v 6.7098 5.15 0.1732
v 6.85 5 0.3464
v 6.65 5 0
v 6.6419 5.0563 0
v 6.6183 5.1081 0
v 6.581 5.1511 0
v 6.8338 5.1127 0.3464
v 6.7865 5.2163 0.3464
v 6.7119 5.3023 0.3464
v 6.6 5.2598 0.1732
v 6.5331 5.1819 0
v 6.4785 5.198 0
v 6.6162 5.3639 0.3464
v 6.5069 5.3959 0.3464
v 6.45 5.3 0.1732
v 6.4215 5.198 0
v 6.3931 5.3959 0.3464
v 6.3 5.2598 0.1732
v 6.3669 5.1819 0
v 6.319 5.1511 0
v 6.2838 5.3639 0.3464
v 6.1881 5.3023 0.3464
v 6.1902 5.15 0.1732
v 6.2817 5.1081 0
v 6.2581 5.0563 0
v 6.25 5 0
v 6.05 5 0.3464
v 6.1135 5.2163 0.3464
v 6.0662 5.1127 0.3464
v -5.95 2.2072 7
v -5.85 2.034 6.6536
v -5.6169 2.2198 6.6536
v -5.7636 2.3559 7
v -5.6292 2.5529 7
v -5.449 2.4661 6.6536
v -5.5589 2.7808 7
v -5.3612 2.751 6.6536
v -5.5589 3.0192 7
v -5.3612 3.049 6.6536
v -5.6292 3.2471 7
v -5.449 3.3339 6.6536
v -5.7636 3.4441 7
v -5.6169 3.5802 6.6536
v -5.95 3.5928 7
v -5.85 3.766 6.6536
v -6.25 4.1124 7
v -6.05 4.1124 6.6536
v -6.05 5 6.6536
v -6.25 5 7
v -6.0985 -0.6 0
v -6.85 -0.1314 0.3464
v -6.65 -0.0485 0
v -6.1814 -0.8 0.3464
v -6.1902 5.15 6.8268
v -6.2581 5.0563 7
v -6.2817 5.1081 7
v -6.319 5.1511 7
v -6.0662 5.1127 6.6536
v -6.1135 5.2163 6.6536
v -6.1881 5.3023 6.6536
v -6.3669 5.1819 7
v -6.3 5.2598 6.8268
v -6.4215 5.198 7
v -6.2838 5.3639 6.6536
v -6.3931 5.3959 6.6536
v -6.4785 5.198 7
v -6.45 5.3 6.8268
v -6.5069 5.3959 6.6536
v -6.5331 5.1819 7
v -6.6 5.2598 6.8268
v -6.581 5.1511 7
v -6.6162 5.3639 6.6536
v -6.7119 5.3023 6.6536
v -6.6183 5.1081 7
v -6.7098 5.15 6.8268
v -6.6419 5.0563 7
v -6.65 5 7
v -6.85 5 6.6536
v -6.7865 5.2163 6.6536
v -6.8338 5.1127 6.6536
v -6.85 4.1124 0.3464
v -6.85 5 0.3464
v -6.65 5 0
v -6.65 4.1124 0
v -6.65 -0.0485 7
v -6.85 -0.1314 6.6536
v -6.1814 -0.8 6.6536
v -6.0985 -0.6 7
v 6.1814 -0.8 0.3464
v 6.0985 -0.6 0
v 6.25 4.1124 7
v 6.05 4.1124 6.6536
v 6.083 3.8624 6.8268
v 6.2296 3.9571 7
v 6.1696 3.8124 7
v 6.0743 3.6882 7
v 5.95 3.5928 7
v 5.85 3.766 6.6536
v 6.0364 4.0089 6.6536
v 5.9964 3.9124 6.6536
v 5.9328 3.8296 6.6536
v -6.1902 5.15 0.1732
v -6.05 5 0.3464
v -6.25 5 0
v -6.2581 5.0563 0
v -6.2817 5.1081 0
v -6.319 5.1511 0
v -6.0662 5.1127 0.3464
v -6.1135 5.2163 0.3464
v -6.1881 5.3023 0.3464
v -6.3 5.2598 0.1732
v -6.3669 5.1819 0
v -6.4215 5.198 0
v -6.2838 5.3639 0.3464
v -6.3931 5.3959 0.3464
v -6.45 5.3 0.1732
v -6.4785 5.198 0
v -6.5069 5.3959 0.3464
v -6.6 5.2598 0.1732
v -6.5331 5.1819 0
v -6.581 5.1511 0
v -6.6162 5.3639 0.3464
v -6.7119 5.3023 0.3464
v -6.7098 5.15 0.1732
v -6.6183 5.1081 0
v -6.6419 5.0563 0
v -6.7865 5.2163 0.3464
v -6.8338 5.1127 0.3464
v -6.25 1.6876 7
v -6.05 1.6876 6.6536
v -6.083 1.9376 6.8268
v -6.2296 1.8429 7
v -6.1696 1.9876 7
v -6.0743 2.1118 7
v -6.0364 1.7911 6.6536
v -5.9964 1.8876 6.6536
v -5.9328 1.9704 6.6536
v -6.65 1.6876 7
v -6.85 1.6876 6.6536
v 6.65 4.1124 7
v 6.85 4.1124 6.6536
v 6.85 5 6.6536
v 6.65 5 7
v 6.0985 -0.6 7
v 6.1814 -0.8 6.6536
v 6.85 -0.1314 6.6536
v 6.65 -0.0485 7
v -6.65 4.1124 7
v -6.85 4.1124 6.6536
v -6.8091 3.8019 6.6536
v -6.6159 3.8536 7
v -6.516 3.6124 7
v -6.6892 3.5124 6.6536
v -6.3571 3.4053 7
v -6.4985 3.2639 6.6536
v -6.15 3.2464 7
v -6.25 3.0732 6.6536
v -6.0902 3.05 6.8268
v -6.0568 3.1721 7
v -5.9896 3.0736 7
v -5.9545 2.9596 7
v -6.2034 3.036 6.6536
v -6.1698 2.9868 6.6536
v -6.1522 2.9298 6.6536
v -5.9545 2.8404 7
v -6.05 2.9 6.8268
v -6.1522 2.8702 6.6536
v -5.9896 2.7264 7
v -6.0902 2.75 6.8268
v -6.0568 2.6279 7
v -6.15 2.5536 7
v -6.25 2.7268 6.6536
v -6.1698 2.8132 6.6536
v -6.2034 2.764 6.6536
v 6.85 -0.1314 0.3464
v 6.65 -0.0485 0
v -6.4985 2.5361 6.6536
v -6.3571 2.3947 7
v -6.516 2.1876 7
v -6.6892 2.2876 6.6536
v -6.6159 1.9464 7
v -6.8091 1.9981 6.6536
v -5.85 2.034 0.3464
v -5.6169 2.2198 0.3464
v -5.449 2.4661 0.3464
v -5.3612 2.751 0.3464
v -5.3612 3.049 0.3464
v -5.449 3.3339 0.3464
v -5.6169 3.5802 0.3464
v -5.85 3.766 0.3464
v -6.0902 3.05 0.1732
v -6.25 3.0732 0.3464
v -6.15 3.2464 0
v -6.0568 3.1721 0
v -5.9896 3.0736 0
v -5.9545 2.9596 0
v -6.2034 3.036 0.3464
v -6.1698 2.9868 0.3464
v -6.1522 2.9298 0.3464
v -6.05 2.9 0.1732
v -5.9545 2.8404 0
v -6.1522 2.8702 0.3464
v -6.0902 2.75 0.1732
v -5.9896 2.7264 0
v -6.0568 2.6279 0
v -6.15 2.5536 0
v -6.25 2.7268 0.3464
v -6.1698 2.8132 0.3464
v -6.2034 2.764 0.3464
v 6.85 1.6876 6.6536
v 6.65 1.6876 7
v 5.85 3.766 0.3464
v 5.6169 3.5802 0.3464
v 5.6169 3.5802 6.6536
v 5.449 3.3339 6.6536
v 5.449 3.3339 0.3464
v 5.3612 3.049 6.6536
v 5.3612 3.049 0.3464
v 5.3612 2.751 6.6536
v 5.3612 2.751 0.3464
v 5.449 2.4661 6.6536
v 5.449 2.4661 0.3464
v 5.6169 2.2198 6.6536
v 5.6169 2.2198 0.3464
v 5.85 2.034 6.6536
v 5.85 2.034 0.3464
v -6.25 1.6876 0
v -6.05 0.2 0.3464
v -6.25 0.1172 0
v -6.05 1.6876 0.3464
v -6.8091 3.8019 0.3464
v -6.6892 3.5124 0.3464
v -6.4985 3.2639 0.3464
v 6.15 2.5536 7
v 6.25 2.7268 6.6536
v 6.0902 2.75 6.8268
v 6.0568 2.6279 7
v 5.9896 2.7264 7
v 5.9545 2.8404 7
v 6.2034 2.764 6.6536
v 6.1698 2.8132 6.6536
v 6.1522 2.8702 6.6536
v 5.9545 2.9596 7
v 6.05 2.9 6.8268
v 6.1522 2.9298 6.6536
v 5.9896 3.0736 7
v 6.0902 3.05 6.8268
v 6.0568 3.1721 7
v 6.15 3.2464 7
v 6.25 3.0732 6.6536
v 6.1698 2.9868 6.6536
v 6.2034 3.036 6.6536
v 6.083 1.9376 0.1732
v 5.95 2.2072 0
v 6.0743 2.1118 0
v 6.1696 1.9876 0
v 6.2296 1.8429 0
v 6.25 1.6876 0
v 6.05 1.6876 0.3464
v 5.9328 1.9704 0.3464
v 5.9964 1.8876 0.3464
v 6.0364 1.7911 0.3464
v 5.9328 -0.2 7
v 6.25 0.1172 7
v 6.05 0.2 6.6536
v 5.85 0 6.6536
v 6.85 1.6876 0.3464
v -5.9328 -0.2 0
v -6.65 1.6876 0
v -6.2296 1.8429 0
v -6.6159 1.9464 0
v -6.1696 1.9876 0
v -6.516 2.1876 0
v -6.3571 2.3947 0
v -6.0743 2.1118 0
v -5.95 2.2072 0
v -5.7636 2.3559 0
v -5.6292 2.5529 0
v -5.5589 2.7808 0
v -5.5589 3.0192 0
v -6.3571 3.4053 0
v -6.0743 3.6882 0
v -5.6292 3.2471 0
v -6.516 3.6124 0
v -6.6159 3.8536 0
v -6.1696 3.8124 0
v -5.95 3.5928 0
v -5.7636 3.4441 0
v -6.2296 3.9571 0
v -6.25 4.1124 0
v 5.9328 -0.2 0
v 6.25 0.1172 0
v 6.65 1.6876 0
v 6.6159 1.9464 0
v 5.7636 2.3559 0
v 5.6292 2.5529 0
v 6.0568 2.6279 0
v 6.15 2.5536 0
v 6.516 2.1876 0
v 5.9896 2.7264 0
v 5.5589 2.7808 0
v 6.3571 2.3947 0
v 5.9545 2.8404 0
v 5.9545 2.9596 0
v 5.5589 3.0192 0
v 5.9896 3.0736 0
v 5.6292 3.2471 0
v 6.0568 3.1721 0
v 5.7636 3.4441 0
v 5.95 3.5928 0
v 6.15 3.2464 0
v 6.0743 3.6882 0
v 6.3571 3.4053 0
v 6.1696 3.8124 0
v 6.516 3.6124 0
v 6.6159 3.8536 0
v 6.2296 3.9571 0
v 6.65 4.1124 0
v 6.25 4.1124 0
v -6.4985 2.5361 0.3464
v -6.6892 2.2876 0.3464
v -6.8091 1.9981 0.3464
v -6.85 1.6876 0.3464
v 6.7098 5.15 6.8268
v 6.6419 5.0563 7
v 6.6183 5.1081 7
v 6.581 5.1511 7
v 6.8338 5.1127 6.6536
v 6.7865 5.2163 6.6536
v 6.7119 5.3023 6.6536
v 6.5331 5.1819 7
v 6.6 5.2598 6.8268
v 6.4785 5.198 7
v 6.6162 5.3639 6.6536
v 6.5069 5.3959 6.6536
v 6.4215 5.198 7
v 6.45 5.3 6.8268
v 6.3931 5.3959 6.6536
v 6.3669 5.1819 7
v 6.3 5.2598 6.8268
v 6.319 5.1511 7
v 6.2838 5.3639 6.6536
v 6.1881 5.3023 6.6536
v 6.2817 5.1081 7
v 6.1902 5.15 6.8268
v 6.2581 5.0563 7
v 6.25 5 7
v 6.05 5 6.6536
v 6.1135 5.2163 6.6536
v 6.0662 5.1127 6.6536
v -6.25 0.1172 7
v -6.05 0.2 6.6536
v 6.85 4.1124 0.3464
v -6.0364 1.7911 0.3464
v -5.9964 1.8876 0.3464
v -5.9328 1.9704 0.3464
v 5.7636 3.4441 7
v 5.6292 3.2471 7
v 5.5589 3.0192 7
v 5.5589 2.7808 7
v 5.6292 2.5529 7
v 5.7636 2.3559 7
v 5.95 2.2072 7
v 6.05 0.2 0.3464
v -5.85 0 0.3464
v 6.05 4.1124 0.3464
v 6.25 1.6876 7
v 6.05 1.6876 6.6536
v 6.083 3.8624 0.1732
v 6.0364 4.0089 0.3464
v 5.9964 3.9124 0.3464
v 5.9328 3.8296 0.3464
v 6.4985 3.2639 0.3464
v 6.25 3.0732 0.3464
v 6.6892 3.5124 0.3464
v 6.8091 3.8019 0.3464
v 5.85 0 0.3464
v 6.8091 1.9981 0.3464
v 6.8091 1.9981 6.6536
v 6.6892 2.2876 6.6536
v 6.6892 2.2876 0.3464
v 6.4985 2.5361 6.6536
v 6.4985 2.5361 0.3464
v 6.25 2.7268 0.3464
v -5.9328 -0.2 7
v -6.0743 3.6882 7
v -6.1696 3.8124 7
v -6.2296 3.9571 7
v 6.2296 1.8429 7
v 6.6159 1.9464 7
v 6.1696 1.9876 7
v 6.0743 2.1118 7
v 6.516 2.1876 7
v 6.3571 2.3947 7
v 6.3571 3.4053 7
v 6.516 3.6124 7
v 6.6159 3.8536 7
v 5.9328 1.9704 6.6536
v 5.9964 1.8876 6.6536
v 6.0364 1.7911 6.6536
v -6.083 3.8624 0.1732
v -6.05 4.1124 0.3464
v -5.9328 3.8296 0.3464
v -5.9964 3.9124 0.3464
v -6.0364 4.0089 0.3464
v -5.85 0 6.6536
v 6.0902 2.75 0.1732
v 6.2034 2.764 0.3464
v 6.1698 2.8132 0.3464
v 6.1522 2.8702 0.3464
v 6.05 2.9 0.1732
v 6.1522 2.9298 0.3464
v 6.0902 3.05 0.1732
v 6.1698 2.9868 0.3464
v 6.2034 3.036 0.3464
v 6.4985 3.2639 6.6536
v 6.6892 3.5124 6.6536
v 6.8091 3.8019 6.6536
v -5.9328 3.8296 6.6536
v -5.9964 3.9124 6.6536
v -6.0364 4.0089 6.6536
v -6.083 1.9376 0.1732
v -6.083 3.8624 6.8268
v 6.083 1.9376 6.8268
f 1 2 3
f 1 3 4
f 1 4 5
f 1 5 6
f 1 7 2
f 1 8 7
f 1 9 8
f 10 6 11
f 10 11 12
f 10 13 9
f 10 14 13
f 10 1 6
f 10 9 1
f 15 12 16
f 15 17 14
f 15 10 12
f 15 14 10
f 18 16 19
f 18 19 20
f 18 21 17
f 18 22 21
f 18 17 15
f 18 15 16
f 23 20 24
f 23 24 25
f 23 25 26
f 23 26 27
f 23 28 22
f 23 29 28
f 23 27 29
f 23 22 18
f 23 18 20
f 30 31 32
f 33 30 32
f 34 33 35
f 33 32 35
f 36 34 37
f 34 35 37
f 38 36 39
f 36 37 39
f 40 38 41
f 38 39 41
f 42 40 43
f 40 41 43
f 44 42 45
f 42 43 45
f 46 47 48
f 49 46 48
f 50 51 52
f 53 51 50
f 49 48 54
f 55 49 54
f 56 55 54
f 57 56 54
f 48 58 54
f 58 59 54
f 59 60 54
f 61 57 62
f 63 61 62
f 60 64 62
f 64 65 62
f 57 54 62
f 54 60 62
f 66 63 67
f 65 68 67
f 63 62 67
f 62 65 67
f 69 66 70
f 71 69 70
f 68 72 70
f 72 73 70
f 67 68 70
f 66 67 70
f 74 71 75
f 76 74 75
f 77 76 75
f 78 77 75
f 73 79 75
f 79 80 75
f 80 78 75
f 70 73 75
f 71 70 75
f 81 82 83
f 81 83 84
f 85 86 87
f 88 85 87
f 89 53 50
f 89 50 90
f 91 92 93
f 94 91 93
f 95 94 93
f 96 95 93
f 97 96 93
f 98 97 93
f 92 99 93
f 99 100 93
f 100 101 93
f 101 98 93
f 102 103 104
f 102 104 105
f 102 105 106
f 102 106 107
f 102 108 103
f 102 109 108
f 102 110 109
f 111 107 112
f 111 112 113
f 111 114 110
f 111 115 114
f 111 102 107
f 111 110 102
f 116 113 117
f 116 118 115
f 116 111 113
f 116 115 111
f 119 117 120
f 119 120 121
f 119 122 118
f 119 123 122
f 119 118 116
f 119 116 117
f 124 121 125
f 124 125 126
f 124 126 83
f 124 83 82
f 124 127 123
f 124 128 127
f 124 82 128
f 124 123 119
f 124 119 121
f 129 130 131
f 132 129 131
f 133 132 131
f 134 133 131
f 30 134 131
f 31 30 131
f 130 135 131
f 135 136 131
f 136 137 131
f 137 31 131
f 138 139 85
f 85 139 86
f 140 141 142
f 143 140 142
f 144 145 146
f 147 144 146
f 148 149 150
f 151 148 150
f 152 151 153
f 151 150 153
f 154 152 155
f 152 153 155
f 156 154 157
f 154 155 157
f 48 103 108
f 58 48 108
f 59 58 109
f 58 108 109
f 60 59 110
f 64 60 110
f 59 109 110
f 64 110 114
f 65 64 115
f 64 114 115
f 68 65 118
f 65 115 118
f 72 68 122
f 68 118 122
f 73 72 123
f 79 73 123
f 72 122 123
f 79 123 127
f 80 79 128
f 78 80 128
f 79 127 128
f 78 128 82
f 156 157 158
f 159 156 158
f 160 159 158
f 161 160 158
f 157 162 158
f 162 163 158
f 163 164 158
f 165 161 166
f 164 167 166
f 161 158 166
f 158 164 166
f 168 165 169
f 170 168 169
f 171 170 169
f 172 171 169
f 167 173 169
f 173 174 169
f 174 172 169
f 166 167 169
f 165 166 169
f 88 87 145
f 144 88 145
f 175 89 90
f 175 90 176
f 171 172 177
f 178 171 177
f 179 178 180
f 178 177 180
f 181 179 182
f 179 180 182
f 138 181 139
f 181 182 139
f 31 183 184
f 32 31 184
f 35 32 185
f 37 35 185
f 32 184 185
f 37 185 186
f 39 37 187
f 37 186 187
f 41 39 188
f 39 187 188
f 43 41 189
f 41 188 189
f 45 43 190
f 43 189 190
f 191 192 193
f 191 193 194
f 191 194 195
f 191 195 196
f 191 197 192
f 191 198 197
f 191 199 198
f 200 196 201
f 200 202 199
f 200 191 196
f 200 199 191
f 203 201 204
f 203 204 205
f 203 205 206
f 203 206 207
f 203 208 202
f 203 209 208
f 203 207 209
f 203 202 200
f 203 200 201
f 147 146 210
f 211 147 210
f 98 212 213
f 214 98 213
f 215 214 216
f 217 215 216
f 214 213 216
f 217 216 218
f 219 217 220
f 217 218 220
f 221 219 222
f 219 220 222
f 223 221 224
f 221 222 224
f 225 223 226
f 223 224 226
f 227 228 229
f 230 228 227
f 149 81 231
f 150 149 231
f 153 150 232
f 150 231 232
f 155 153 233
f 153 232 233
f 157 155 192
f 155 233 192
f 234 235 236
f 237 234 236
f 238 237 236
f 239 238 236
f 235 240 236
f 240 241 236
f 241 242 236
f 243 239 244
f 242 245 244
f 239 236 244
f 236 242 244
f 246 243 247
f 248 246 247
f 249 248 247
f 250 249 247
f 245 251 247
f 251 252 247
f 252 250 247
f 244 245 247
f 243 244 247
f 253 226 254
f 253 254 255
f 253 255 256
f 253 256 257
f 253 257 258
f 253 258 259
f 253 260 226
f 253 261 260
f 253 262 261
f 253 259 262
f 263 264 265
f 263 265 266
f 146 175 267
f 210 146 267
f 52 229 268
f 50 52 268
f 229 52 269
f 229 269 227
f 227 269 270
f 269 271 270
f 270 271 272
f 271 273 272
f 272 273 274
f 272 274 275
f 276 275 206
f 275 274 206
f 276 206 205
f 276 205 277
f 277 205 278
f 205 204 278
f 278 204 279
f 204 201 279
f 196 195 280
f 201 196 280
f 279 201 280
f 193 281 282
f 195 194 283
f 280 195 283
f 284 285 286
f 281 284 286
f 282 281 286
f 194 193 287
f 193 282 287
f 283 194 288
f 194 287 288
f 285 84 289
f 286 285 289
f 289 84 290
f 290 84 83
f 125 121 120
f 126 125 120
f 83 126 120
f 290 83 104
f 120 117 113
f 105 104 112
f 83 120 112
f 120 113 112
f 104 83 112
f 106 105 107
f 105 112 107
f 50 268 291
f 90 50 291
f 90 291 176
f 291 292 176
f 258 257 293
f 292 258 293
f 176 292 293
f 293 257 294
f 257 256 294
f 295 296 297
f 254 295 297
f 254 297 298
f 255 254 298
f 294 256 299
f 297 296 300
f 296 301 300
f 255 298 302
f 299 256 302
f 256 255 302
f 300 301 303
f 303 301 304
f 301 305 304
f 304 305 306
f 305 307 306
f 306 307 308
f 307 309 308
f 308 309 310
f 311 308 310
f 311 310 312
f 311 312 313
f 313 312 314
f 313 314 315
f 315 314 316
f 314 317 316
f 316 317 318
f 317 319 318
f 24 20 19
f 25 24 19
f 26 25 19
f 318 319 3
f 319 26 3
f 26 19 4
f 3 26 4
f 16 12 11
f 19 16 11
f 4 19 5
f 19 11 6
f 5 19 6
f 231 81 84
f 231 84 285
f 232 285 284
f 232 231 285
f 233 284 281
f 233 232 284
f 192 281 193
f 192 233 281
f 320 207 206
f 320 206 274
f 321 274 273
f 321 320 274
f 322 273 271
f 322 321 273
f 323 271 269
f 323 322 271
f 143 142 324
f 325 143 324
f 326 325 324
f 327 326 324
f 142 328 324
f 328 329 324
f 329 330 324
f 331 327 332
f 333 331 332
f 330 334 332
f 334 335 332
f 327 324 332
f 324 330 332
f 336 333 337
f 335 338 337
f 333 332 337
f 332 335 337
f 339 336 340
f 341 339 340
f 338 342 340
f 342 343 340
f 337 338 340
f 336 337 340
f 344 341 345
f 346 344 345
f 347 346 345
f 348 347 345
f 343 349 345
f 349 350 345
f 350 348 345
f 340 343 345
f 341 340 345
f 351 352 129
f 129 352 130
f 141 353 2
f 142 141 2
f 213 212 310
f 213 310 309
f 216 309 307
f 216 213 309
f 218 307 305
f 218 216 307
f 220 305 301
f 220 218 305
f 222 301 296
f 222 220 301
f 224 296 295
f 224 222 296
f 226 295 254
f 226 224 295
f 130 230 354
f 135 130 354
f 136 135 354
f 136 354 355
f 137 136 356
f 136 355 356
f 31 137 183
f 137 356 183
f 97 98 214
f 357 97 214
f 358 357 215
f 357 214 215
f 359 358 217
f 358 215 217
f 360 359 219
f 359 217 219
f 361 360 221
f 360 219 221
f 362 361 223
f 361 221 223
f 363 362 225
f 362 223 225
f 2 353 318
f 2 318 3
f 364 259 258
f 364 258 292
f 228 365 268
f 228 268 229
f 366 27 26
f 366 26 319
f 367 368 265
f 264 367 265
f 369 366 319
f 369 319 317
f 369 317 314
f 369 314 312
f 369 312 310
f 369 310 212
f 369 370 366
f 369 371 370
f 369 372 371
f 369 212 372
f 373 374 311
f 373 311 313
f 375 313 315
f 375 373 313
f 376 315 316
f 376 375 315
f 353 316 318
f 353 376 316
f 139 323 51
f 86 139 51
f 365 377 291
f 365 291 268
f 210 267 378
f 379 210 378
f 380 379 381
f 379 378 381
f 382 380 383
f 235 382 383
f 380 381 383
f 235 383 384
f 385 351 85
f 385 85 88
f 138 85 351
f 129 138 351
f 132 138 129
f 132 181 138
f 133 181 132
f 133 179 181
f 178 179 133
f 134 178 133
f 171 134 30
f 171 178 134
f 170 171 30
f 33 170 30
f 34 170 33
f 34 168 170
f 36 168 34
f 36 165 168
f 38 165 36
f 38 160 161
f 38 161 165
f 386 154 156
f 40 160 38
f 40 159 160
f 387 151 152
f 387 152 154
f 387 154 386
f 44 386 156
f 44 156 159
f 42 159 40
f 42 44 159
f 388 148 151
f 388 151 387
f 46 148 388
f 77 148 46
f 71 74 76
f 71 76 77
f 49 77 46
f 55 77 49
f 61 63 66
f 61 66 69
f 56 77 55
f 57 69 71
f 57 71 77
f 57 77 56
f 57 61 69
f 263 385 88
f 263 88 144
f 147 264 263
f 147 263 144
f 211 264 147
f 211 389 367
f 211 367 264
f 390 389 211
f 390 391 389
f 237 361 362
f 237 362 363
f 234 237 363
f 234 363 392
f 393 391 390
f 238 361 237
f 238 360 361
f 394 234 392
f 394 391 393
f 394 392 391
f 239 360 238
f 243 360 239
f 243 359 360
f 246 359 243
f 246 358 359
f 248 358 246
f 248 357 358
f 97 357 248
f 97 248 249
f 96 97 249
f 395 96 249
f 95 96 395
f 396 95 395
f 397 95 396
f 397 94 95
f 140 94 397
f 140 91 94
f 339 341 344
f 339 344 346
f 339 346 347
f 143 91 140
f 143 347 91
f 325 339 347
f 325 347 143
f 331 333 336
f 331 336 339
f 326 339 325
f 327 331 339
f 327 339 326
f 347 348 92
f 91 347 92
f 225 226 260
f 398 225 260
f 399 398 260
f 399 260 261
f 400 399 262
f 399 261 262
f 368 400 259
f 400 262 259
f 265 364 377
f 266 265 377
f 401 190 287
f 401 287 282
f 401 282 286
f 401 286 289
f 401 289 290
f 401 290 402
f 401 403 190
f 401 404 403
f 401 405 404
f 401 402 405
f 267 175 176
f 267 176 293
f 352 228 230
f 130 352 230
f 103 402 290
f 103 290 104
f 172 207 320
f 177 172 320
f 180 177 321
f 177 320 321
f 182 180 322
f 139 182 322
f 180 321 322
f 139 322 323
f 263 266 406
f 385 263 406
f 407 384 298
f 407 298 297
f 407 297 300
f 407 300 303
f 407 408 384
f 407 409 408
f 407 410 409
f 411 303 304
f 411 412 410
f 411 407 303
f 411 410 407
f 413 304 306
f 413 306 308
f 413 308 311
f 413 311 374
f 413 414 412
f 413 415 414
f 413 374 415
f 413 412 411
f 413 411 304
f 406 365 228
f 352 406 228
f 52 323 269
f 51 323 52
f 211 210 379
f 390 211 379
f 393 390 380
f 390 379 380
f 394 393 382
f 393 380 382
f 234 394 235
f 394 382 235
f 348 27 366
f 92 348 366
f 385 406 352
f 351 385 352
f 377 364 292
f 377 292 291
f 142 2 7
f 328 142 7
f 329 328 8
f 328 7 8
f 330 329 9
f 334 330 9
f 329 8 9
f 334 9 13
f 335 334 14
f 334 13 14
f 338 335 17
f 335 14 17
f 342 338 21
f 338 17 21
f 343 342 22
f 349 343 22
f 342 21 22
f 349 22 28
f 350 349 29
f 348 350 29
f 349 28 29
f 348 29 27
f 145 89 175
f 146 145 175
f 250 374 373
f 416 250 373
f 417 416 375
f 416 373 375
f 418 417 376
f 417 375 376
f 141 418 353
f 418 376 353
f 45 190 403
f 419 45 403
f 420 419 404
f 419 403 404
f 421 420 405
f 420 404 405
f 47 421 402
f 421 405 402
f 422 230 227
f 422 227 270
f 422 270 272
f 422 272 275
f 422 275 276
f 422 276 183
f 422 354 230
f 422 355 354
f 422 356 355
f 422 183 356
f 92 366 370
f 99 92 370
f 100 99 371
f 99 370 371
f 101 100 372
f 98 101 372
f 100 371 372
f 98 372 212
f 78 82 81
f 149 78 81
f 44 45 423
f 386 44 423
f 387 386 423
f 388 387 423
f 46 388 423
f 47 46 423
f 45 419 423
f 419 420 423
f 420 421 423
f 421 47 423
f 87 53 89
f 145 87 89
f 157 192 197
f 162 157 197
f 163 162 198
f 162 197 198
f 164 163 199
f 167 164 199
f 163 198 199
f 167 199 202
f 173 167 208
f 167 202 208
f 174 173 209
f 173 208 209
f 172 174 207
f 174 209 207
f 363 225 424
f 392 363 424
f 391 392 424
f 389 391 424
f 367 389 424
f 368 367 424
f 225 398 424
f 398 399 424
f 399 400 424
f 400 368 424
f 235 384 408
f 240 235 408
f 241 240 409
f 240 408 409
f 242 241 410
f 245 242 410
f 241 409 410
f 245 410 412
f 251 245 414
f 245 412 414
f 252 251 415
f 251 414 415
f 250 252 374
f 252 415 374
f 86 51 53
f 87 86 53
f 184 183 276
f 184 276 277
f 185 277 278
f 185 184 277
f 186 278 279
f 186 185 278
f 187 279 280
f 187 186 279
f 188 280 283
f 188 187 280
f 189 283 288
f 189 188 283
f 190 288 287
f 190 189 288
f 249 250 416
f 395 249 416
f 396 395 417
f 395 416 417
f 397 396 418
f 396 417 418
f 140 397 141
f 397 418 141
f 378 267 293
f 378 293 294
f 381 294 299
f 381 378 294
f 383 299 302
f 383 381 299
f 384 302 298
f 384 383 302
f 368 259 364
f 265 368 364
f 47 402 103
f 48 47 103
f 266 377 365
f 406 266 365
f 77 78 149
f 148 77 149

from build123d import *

# Parameters (mm, degrees)
BOSS_EXTRUDE1_DEPTH   = 7
CHAMFER1_SIZE         = 0.2
CHAMFER1_SIZE2        = 0.346410162
CHAMFER1_PART_2_SIZE  = 0.2
CHAMFER1_PART_2_SIZE2 = 0.346410162


with BuildPart() as part:
    # Sketch1 → Boss-Extrude1 (new body)
    with BuildSketch(Plane.XY):
        with BuildLine():
            Line((5.85, 0), (-5.85, 0))
            Line((-5.85, 0), (-6.05, 0.2))
            Line((-6.05, 0.2), (-6.05, 1.687564435))
            ThreePointArc((-6.05, 1.687564435), (-5.996410162, 1.887564435), (-5.85, 2.033974596))
            ThreePointArc((-5.85, 2.033974596), (-5.35, 2.9), (-5.85, 3.766025404))
            ThreePointArc((-5.85, 3.766025404), (-5.996410162, 3.912435565), (-6.05, 4.112435565))
            Line((-6.05, 4.112435565), (-6.05, 5))
            ThreePointArc((-6.05, 5), (-6.45, 5.4), (-6.85, 5))
            Line((-6.85, 5), (-6.85, 4.112435565))
            ThreePointArc((-6.85, 4.112435565), (-6.689230485, 3.512435565), (-6.25, 3.073205081))
            ThreePointArc((-6.25, 3.073205081), (-6.15, 2.9), (-6.25, 2.726794919))
            ThreePointArc((-6.25, 2.726794919), (-6.689230485, 2.287564435), (-6.85, 1.687564435))
            Line((-6.85, 1.687564435), (-6.85, -0.13137085))
            Line((-6.85, -0.13137085), (-6.18137085, -0.8))
            Line((-6.18137085, -0.8), (6.18137085, -0.8))
            Line((6.18137085, -0.8), (6.85, -0.13137085))
            Line((6.85, -0.13137085), (6.85, 1.687564435))
            ThreePointArc((6.85, 1.687564435), (6.689230485, 2.287564435), (6.25, 2.726794919))
            ThreePointArc((6.25, 2.726794919), (6.15, 2.9), (6.25, 3.073205081))
            ThreePointArc((6.25, 3.073205081), (6.689230485, 3.512435565), (6.85, 4.112435565))
            Line((6.85, 4.112435565), (6.85, 5))
            ThreePointArc((6.85, 5), (6.45, 5.4), (6.05, 5))
            Line((6.05, 5), (6.05, 4.112435565))
            ThreePointArc((6.05, 4.112435565), (5.996410162, 3.912435565), (5.85, 3.766025404))
            ThreePointArc((5.85, 3.766025404), (5.35, 2.9), (5.85, 2.033974596))
            ThreePointArc((5.85, 2.033974596), (5.996410162, 1.887564435), (6.05, 1.687564435))
            Line((6.05, 1.687564435), (6.05, 0.2))
            Line((6.05, 0.2), (5.85, 0))
        make_face()
    extrude(amount=BOSS_EXTRUDE1_DEPTH)

    # Chamfer1
    chamfer1_edges = [part.edges().sort_by_distance(p)[0] for p in [
        (5.95, 0.1, 7),
        (0, 0, 7),
        (-5.95, 0.1, 7),
        (-6.05, 0.943782217, 7),
        (-5.996410162, 3.912435565, 7),
        (-6.05, 4.556217783, 7),
        (-6.45, 5.4, 7),
        (-6.85, 4.556217783, 7),
        (-6.689230485, 3.512435565, 7),
        (-6.15, 2.9, 7),
        (-6.689230485, 2.287564435, 7),
        (-6.85, 0.778096792, 7),
        (-6.515685425, -0.465685425, 7),
        (0, -0.8, 7),
        (-5.996410162, 1.887564435, 7),
        (6.515685425, -0.465685425, 7),
        (6.85, 0.778096792, 7),
        (6.689230485, 2.287564435, 7),
        (6.15, 2.9, 7),
        (6.689230485, 3.512435565, 7),
        (6.85, 4.556217783, 7),
        (6.45, 5.4, 7),
        (6.05, 4.556217783, 7),
        (5.996410162, 3.912435565, 7),
        (5.35, 2.9, 7),
        (-5.35, 2.9, 7),
        (5.996410162, 1.887564435, 7),
        (6.05, 0.943782217, 7),
    ]]
    chamfer1_side = [part.faces().sort_by_distance(p)[0] for p in [
        (6.126639766, 1.962752532, 7),
    ]]
    chamfer(chamfer1_edges, length=CHAMFER1_SIZE, length2=CHAMFER1_SIZE2, reference=chamfer1_side[0])

    # Chamfer1 part 2
    chamfer1_part_2_edges = [part.edges().sort_by_distance(p)[0] for p in [
        (-6.05, 0.943782217, 0),
        (-5.95, 0.1, 0),
        (0, 0, 0),
        (5.95, 0.1, 0),
        (6.05, 0.943782217, 0),
        (5.996410162, 1.887564435, 0),
        (5.35, 2.9, 0),
        (5.996410162, 3.912435565, 0),
        (6.05, 4.556217783, 0),
        (6.45, 5.4, 0),
        (6.85, 4.556217783, 0),
        (6.689230485, 3.512435565, 0),
        (6.15, 2.9, 0),
        (6.689230485, 2.287564435, 0),
        (6.85, 0.778096792, 0),
        (6.515685425, -0.465685425, 0),
        (0, -0.8, 0),
        (-6.515685425, -0.465685425, 0),
        (-6.85, 0.778096792, 0),
        (-6.689230485, 2.287564435, 0),
        (-6.15, 2.9, 0),
        (-6.689230485, 3.512435565, 0),
        (-6.85, 4.556217783, 0),
        (-6.45, 5.4, 0),
        (-6.05, 4.556217783, 0),
        (-5.996410162, 3.912435565, 0),
        (-5.35, 2.9, 0),
        (-5.996410162, 1.887564435, 0),
    ]]
    chamfer1_part_2_side = [part.faces().sort_by_distance(p)[0] for p in [
        (6.126639766, 1.962752532, 0),
    ]]
    chamfer(chamfer1_part_2_edges, length=CHAMFER1_PART_2_SIZE, length2=CHAMFER1_PART_2_SIZE2, reference=chamfer1_part_2_side[0])


solid = part.part
